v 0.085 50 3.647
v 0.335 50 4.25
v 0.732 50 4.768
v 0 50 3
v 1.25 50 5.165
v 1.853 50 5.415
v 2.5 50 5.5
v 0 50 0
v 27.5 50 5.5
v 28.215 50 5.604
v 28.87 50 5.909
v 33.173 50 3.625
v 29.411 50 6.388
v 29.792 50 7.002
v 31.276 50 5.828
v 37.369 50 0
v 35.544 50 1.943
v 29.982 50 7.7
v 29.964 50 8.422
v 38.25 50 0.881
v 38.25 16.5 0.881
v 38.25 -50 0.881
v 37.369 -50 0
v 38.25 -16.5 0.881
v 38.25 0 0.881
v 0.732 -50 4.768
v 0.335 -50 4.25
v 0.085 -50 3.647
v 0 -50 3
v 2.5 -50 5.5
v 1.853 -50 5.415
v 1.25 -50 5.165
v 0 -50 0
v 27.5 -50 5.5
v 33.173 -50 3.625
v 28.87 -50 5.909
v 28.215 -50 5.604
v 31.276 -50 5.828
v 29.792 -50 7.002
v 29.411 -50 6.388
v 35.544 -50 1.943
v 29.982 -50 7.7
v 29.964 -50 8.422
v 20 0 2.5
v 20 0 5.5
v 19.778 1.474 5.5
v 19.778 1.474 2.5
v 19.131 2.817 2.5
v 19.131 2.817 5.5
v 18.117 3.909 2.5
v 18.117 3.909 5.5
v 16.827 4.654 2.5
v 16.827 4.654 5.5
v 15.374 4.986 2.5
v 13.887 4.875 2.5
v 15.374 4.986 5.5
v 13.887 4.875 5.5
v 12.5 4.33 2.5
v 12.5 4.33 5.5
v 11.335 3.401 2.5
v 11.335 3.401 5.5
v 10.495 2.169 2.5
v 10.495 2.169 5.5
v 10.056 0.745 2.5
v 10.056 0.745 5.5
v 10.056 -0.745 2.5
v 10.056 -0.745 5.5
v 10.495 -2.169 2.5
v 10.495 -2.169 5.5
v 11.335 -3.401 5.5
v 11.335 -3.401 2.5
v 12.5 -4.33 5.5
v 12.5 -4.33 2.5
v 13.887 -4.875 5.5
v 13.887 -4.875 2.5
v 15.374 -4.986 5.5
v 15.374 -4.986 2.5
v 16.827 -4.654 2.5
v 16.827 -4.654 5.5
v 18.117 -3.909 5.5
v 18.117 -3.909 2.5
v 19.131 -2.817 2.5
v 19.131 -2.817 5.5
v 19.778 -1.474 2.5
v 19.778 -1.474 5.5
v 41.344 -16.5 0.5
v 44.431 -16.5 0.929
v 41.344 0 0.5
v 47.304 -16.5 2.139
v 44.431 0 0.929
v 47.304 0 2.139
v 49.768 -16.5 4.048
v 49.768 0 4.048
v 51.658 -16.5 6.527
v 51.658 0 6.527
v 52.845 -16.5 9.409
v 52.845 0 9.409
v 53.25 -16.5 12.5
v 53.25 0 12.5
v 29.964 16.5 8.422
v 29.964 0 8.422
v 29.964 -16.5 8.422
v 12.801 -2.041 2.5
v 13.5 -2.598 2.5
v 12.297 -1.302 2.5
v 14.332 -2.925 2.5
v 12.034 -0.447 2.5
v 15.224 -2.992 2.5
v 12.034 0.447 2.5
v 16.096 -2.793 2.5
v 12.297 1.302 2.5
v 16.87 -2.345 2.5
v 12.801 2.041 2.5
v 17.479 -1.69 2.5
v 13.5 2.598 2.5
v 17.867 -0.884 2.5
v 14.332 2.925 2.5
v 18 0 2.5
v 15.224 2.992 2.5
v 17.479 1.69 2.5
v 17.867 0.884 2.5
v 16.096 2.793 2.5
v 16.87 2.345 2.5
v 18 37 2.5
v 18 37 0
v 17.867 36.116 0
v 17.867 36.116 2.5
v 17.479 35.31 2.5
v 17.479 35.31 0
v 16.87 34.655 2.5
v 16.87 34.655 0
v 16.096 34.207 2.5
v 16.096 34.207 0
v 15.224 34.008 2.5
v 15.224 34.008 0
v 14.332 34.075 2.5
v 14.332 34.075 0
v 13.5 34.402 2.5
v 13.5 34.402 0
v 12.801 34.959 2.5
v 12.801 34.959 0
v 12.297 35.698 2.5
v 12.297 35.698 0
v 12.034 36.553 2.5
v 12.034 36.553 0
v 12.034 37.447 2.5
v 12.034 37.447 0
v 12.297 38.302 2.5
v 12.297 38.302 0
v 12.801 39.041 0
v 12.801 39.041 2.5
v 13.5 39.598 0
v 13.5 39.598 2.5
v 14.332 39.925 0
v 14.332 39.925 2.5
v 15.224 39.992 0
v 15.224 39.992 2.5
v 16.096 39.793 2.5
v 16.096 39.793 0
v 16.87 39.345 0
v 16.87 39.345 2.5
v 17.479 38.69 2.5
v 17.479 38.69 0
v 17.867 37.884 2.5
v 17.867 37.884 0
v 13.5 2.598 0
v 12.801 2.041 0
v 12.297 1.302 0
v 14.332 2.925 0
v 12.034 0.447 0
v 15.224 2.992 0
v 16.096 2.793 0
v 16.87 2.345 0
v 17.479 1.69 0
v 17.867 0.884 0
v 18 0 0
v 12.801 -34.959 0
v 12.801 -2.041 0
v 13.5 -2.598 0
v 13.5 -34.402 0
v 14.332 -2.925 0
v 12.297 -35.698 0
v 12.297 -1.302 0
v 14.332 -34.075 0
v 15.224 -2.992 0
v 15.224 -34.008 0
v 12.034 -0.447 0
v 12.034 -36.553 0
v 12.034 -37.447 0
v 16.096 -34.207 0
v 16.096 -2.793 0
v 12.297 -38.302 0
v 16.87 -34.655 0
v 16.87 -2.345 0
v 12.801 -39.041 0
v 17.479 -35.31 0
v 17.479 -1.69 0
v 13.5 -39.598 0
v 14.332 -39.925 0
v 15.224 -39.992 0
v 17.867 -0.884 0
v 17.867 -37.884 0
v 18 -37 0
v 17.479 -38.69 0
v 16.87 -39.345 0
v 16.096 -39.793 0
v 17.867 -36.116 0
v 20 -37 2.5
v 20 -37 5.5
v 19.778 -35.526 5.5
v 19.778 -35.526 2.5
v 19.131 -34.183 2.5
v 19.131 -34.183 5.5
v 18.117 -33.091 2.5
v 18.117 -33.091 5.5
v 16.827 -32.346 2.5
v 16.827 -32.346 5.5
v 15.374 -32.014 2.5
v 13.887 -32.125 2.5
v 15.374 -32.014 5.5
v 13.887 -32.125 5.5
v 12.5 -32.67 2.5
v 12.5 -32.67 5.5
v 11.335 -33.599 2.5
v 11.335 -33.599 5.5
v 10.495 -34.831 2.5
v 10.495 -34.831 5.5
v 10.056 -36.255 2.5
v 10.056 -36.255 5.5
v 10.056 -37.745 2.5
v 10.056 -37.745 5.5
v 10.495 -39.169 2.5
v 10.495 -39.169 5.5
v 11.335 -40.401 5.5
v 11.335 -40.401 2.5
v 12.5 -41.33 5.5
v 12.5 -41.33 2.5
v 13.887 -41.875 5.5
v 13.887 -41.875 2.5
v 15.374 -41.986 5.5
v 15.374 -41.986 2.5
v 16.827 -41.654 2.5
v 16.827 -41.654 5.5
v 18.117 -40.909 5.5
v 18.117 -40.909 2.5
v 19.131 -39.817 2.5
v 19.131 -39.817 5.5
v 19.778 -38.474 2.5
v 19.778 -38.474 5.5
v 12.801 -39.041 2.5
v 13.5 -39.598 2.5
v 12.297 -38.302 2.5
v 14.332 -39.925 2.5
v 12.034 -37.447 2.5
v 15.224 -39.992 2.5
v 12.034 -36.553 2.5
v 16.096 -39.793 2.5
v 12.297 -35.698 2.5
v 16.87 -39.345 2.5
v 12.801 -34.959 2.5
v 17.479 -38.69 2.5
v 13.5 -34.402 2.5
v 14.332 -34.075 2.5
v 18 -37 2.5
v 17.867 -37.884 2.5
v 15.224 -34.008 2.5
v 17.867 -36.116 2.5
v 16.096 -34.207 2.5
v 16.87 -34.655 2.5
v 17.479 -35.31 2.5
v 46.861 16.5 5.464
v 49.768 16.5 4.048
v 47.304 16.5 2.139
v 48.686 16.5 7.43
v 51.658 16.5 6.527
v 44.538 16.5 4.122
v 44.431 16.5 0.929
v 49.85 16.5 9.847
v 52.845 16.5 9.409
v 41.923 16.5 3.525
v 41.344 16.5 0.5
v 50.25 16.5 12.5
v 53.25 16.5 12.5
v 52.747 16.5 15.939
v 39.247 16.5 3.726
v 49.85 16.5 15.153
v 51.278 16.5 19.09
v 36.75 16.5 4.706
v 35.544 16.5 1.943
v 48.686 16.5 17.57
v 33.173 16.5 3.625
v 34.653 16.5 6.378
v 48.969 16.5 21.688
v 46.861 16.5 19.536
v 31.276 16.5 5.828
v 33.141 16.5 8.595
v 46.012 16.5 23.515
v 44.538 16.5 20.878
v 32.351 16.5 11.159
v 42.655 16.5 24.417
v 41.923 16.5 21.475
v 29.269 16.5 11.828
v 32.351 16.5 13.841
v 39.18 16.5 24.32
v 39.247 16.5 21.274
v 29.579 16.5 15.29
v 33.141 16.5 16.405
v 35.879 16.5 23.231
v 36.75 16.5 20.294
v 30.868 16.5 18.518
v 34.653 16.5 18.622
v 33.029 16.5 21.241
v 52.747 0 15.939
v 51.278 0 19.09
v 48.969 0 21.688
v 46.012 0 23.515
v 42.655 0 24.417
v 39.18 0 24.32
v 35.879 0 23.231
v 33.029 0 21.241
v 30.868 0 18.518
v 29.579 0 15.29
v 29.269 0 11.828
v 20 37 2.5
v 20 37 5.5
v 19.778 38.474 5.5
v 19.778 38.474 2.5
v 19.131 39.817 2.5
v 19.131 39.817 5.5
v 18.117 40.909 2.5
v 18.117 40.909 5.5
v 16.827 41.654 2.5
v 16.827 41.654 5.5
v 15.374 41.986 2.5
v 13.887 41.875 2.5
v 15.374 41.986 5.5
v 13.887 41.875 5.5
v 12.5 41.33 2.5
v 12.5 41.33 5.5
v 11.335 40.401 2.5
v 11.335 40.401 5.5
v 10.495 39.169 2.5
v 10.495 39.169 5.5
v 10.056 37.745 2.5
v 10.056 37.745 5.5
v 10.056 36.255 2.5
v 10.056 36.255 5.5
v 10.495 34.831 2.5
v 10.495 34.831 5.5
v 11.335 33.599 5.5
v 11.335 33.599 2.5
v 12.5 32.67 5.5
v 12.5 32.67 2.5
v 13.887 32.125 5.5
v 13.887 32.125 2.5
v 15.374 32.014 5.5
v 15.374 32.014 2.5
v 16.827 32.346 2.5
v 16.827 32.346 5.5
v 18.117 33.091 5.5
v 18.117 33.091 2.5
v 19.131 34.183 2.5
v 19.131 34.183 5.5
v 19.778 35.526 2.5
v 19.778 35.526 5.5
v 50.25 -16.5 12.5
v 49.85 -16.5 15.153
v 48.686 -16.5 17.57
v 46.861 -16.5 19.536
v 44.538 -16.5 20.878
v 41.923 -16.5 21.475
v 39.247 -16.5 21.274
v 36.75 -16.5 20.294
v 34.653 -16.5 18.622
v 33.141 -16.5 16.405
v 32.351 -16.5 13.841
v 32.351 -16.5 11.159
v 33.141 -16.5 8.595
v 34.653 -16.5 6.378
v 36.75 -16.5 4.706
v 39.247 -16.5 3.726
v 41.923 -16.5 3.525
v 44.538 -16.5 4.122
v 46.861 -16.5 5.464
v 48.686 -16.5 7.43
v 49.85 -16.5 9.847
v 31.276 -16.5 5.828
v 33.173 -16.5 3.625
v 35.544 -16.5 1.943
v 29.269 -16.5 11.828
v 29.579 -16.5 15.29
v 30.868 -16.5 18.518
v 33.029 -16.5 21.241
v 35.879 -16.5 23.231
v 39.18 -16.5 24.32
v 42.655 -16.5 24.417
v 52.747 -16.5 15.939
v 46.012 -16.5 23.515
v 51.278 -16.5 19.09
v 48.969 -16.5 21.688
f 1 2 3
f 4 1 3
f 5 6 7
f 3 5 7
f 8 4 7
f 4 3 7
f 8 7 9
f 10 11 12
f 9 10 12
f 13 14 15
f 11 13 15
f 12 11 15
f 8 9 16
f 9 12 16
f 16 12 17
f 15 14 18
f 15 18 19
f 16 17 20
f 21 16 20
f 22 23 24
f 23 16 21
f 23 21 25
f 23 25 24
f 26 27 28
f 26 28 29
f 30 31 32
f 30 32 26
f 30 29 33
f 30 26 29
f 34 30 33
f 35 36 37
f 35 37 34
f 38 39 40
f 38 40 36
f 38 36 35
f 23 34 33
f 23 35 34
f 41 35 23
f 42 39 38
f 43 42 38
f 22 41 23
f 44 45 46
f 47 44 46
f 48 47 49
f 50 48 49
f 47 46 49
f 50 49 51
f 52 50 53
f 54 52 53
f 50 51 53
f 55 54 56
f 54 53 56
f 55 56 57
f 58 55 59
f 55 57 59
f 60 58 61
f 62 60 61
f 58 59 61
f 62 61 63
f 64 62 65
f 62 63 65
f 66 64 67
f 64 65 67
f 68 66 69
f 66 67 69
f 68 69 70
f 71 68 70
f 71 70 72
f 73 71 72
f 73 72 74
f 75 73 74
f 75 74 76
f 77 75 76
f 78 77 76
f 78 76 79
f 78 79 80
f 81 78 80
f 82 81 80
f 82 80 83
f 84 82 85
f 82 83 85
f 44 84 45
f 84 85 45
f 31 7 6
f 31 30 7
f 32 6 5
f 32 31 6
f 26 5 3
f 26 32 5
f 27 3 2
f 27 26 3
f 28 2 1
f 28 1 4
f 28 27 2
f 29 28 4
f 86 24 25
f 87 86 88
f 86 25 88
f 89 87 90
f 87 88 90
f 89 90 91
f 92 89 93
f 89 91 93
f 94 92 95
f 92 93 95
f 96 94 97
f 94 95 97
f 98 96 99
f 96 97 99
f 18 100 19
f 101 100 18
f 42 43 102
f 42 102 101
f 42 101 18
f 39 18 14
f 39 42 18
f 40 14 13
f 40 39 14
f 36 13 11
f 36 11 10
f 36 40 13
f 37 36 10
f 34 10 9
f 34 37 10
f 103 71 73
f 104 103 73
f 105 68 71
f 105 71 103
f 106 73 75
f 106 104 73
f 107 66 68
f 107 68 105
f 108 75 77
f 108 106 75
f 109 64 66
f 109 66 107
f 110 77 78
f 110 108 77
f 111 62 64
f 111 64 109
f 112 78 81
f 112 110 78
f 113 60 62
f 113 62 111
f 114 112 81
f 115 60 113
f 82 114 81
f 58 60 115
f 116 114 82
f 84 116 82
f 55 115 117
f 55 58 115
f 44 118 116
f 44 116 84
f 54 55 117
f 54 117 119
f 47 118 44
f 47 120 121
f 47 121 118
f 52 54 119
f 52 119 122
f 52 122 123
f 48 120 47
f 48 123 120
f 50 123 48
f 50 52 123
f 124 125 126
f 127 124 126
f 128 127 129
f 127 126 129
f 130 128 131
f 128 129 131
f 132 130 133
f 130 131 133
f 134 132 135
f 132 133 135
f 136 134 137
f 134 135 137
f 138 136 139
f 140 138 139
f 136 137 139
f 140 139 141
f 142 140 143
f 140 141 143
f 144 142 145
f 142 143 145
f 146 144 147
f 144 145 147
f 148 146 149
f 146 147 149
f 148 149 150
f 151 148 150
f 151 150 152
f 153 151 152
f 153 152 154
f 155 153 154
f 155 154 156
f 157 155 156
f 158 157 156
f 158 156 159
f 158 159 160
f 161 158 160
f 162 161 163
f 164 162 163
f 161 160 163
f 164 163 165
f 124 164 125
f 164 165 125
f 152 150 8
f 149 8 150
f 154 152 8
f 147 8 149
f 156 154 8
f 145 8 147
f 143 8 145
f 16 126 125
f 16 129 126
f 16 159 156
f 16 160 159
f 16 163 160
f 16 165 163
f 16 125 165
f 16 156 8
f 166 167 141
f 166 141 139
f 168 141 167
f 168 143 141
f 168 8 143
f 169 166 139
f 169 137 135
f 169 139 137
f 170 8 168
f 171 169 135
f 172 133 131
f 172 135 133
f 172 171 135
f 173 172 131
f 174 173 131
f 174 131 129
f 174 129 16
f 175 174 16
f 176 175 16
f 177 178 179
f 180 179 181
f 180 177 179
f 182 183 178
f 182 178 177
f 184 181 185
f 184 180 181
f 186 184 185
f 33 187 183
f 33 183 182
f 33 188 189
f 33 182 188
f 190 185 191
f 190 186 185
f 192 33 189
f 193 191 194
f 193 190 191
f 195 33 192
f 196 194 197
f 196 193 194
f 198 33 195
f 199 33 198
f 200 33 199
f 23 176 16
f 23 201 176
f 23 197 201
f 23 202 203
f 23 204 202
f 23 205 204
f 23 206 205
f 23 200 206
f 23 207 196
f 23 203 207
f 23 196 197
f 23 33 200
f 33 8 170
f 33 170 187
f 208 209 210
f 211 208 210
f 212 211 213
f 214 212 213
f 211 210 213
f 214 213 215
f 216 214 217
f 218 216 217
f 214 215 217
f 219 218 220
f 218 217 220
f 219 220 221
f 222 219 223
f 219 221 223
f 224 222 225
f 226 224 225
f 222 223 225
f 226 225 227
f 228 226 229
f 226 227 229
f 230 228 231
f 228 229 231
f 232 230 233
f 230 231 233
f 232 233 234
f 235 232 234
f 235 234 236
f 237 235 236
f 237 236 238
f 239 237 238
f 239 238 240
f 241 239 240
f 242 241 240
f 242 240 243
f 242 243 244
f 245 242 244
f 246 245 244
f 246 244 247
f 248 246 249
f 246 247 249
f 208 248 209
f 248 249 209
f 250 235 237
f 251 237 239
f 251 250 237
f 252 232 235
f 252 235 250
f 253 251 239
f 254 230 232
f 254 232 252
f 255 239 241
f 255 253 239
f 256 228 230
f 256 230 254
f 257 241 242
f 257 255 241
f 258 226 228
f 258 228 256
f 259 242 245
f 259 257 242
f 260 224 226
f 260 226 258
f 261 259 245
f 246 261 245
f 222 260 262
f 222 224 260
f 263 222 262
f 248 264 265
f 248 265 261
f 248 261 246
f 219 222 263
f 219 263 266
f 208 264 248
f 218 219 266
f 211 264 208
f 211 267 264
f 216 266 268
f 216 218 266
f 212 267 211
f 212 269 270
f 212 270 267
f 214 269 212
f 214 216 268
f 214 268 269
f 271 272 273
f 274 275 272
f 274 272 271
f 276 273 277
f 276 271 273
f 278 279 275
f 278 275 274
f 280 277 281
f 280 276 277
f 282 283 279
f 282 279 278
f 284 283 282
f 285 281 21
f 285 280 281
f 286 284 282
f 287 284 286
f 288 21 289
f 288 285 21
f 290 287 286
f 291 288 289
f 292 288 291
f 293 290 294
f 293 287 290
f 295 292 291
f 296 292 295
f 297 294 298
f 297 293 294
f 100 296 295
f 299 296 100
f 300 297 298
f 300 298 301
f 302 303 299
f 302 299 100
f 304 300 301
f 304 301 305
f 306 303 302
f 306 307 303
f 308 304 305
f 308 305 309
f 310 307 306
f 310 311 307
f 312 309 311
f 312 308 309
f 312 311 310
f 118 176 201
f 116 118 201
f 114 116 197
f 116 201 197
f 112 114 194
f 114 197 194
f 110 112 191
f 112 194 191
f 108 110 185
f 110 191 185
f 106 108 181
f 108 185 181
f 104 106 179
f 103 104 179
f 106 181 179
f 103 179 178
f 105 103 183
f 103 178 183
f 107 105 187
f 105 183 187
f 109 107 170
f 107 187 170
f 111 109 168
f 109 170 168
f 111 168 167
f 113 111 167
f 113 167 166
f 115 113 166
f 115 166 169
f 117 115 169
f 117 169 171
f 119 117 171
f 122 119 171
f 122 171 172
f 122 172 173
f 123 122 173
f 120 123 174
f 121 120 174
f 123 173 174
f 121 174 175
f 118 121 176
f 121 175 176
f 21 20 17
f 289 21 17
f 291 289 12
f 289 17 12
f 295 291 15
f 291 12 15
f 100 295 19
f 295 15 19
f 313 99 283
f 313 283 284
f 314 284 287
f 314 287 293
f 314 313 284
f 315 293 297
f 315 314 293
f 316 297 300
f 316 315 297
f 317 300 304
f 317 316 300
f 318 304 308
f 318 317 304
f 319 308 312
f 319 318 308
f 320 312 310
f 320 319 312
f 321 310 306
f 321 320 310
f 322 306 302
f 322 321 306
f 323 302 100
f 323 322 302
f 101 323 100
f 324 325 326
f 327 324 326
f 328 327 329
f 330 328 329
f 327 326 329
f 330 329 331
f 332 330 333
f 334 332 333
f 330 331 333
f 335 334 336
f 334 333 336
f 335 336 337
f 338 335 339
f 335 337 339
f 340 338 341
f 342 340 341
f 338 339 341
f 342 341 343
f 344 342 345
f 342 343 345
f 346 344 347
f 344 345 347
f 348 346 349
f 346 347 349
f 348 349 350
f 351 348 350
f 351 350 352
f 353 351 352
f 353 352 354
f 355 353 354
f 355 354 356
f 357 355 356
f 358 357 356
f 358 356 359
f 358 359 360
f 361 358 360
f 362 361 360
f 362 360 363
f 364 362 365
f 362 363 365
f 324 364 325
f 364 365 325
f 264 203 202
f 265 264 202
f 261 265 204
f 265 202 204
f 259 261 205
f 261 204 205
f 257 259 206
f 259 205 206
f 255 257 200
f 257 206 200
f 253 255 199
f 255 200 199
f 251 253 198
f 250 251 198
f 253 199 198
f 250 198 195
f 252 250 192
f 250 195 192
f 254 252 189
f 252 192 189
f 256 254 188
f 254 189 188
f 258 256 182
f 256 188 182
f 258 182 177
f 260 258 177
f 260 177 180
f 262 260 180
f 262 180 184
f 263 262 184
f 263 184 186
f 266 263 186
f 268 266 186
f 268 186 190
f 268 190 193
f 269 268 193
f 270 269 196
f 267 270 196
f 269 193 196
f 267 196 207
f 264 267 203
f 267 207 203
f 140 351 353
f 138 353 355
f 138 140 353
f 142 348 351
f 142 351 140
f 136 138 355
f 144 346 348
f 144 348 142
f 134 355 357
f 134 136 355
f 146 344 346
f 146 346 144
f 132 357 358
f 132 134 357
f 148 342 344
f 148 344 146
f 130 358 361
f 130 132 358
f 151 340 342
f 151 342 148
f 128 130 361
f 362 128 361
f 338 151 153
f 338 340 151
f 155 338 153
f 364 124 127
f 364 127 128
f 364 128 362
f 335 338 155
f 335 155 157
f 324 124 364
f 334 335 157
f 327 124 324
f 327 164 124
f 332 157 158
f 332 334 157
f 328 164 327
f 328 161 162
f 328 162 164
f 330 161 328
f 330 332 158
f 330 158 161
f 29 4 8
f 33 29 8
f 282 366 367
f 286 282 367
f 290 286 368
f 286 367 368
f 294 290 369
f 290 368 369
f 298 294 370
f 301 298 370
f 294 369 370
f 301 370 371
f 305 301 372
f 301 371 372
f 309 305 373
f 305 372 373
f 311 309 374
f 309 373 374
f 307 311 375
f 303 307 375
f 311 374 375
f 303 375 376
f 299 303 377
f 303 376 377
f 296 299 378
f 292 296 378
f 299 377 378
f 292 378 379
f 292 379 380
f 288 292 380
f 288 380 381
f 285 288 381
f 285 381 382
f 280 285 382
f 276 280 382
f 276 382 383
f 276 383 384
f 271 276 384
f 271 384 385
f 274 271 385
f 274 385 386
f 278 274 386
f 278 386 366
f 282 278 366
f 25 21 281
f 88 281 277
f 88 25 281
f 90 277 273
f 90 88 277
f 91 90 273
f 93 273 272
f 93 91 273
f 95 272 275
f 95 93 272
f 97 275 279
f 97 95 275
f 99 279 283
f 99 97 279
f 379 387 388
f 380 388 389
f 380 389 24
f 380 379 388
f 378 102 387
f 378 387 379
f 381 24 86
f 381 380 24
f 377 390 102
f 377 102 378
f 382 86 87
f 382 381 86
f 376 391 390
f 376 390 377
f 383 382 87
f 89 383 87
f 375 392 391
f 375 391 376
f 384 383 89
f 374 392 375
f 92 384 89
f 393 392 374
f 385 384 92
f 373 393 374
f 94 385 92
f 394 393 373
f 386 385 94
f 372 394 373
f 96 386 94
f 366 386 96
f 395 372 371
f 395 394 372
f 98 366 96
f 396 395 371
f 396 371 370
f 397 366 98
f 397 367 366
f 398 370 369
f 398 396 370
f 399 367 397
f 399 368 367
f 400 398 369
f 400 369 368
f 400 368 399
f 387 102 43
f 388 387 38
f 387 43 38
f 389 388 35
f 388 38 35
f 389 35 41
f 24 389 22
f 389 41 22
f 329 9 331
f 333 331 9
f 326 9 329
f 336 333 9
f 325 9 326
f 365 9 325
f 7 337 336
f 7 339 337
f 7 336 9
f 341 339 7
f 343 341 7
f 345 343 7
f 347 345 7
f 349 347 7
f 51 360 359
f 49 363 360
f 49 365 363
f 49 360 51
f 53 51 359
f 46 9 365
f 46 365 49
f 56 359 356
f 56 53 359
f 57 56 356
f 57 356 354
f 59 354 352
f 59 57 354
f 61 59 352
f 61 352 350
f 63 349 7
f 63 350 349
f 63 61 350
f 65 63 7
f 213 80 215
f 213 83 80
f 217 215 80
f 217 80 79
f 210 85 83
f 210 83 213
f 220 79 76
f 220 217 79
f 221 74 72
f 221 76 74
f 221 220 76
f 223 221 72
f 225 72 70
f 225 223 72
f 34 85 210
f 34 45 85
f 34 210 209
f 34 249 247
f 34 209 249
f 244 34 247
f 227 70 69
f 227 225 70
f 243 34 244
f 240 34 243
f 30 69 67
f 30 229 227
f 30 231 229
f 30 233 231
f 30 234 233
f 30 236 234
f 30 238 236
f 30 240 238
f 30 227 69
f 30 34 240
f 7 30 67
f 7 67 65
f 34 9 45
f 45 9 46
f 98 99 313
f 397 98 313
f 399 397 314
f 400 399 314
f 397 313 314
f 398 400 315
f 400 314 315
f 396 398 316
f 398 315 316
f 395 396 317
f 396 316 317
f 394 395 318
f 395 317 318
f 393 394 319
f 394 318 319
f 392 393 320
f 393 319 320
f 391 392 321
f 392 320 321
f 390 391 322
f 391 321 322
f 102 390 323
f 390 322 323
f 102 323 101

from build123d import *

# Parameters (mm, degrees)
F1_DEPTH  = 50
F2_R      = 2.5
F3_R      = 9
F4_DEPTH  = 100
F5_R      = 12
F7_DEPTH  = 33.5
F6_R      = 12
F8_DEPTH  = 33.5
F9_R      = 5
F11_DEPTH = 3
F10_R     = 3
F12_DEPTH = 2.5


with BuildPart() as f1:
    # F0 (on Front) → F1 (new body, symmetric)
    with BuildSketch(Plane.XZ):
        with BuildLine():
            Line((27.5, 5.5), (0, 5.5))
            Line((0, 5.5), (0, 0))
            Line((0, 0), (37.3689500386, 0))
            Line((37.3689500386, 0), (38.25, 0.8810499614))
            ThreePointArc((38.25, 0.8810499614), (33.172918626, 3.6252742871), (29.9640842591, 8.4222425415))
            ThreePointArc((29.9640842591, 8.4222425415), (29.4112308016, 6.388417913), (27.5, 5.5))
        make_face()
        with BuildLine():
            ThreePointArc((53.25, 12.5), (39.1800952788, 24.320130898), (29.9640842591, 8.4222425415))
            ThreePointArc((29.9640842591, 8.4222425415), (33.172918626, 3.6252742871), (38.25, 0.8810499614))
            ThreePointArc((38.25, 0.8810499614), (48.5984692283, 3.0131670195), (53.25, 12.5))
        make_face()
    extrude(amount=F1_DEPTH, both=True)

    # F2
    f2_edges = [f1.edges().sort_by_distance(p)[0] for p in [
        (0, 0, 5.5),
    ]]
    fillet(f2_edges, radius=F2_R)

    # F3 (on face) → F4 (cut, through all)
    with BuildSketch(Plane.XZ.offset(50)):
        with Locations((41.25, 12.5)):
            Circle(F3_R)
    extrude(amount=-F4_DEPTH, mode=Mode.SUBTRACT)

    # F5 (on face) → F7 (cut)
    with BuildSketch(Plane.XZ.offset(50)):
        with Locations((41.25, 12.5)):
            Circle(F5_R)
    extrude(amount=-F7_DEPTH, mode=Mode.SUBTRACT)

    # F6 (on face) → F8 (cut)
    with BuildSketch(Plane(origin=(0, 50, 0), x_dir=(-1, 0, 0), z_dir=(0, 1, 0))):
        with Locations((-41.25, 12.5)):
            Circle(F6_R)
    extrude(amount=-F8_DEPTH, mode=Mode.SUBTRACT)

    # F9 (on face) → F11 (cut)
    with BuildSketch(Plane.XY.offset(5.5)):
        with Locations((15, 0)):
            Circle(F9_R)
        with Locations((15, 37)):
            Circle(F9_R)
        with Locations((15, -37)):
            Circle(F9_R)
    extrude(amount=-F11_DEPTH, mode=Mode.SUBTRACT)

    # F10 (on face) → F12 (cut, through all)
    with BuildSketch(Plane(origin=(0, 0, 0), x_dir=(1, 0, 0), z_dir=(0, 0, -1))):
        with Locations((15, -37)):
            Circle(F10_R)
        with Locations((15, 0)):
            Circle(F10_R)
        with Locations((15, 37)):
            Circle(F10_R)
    extrude(amount=-F12_DEPTH, mode=Mode.SUBTRACT)


solid = f1.part
